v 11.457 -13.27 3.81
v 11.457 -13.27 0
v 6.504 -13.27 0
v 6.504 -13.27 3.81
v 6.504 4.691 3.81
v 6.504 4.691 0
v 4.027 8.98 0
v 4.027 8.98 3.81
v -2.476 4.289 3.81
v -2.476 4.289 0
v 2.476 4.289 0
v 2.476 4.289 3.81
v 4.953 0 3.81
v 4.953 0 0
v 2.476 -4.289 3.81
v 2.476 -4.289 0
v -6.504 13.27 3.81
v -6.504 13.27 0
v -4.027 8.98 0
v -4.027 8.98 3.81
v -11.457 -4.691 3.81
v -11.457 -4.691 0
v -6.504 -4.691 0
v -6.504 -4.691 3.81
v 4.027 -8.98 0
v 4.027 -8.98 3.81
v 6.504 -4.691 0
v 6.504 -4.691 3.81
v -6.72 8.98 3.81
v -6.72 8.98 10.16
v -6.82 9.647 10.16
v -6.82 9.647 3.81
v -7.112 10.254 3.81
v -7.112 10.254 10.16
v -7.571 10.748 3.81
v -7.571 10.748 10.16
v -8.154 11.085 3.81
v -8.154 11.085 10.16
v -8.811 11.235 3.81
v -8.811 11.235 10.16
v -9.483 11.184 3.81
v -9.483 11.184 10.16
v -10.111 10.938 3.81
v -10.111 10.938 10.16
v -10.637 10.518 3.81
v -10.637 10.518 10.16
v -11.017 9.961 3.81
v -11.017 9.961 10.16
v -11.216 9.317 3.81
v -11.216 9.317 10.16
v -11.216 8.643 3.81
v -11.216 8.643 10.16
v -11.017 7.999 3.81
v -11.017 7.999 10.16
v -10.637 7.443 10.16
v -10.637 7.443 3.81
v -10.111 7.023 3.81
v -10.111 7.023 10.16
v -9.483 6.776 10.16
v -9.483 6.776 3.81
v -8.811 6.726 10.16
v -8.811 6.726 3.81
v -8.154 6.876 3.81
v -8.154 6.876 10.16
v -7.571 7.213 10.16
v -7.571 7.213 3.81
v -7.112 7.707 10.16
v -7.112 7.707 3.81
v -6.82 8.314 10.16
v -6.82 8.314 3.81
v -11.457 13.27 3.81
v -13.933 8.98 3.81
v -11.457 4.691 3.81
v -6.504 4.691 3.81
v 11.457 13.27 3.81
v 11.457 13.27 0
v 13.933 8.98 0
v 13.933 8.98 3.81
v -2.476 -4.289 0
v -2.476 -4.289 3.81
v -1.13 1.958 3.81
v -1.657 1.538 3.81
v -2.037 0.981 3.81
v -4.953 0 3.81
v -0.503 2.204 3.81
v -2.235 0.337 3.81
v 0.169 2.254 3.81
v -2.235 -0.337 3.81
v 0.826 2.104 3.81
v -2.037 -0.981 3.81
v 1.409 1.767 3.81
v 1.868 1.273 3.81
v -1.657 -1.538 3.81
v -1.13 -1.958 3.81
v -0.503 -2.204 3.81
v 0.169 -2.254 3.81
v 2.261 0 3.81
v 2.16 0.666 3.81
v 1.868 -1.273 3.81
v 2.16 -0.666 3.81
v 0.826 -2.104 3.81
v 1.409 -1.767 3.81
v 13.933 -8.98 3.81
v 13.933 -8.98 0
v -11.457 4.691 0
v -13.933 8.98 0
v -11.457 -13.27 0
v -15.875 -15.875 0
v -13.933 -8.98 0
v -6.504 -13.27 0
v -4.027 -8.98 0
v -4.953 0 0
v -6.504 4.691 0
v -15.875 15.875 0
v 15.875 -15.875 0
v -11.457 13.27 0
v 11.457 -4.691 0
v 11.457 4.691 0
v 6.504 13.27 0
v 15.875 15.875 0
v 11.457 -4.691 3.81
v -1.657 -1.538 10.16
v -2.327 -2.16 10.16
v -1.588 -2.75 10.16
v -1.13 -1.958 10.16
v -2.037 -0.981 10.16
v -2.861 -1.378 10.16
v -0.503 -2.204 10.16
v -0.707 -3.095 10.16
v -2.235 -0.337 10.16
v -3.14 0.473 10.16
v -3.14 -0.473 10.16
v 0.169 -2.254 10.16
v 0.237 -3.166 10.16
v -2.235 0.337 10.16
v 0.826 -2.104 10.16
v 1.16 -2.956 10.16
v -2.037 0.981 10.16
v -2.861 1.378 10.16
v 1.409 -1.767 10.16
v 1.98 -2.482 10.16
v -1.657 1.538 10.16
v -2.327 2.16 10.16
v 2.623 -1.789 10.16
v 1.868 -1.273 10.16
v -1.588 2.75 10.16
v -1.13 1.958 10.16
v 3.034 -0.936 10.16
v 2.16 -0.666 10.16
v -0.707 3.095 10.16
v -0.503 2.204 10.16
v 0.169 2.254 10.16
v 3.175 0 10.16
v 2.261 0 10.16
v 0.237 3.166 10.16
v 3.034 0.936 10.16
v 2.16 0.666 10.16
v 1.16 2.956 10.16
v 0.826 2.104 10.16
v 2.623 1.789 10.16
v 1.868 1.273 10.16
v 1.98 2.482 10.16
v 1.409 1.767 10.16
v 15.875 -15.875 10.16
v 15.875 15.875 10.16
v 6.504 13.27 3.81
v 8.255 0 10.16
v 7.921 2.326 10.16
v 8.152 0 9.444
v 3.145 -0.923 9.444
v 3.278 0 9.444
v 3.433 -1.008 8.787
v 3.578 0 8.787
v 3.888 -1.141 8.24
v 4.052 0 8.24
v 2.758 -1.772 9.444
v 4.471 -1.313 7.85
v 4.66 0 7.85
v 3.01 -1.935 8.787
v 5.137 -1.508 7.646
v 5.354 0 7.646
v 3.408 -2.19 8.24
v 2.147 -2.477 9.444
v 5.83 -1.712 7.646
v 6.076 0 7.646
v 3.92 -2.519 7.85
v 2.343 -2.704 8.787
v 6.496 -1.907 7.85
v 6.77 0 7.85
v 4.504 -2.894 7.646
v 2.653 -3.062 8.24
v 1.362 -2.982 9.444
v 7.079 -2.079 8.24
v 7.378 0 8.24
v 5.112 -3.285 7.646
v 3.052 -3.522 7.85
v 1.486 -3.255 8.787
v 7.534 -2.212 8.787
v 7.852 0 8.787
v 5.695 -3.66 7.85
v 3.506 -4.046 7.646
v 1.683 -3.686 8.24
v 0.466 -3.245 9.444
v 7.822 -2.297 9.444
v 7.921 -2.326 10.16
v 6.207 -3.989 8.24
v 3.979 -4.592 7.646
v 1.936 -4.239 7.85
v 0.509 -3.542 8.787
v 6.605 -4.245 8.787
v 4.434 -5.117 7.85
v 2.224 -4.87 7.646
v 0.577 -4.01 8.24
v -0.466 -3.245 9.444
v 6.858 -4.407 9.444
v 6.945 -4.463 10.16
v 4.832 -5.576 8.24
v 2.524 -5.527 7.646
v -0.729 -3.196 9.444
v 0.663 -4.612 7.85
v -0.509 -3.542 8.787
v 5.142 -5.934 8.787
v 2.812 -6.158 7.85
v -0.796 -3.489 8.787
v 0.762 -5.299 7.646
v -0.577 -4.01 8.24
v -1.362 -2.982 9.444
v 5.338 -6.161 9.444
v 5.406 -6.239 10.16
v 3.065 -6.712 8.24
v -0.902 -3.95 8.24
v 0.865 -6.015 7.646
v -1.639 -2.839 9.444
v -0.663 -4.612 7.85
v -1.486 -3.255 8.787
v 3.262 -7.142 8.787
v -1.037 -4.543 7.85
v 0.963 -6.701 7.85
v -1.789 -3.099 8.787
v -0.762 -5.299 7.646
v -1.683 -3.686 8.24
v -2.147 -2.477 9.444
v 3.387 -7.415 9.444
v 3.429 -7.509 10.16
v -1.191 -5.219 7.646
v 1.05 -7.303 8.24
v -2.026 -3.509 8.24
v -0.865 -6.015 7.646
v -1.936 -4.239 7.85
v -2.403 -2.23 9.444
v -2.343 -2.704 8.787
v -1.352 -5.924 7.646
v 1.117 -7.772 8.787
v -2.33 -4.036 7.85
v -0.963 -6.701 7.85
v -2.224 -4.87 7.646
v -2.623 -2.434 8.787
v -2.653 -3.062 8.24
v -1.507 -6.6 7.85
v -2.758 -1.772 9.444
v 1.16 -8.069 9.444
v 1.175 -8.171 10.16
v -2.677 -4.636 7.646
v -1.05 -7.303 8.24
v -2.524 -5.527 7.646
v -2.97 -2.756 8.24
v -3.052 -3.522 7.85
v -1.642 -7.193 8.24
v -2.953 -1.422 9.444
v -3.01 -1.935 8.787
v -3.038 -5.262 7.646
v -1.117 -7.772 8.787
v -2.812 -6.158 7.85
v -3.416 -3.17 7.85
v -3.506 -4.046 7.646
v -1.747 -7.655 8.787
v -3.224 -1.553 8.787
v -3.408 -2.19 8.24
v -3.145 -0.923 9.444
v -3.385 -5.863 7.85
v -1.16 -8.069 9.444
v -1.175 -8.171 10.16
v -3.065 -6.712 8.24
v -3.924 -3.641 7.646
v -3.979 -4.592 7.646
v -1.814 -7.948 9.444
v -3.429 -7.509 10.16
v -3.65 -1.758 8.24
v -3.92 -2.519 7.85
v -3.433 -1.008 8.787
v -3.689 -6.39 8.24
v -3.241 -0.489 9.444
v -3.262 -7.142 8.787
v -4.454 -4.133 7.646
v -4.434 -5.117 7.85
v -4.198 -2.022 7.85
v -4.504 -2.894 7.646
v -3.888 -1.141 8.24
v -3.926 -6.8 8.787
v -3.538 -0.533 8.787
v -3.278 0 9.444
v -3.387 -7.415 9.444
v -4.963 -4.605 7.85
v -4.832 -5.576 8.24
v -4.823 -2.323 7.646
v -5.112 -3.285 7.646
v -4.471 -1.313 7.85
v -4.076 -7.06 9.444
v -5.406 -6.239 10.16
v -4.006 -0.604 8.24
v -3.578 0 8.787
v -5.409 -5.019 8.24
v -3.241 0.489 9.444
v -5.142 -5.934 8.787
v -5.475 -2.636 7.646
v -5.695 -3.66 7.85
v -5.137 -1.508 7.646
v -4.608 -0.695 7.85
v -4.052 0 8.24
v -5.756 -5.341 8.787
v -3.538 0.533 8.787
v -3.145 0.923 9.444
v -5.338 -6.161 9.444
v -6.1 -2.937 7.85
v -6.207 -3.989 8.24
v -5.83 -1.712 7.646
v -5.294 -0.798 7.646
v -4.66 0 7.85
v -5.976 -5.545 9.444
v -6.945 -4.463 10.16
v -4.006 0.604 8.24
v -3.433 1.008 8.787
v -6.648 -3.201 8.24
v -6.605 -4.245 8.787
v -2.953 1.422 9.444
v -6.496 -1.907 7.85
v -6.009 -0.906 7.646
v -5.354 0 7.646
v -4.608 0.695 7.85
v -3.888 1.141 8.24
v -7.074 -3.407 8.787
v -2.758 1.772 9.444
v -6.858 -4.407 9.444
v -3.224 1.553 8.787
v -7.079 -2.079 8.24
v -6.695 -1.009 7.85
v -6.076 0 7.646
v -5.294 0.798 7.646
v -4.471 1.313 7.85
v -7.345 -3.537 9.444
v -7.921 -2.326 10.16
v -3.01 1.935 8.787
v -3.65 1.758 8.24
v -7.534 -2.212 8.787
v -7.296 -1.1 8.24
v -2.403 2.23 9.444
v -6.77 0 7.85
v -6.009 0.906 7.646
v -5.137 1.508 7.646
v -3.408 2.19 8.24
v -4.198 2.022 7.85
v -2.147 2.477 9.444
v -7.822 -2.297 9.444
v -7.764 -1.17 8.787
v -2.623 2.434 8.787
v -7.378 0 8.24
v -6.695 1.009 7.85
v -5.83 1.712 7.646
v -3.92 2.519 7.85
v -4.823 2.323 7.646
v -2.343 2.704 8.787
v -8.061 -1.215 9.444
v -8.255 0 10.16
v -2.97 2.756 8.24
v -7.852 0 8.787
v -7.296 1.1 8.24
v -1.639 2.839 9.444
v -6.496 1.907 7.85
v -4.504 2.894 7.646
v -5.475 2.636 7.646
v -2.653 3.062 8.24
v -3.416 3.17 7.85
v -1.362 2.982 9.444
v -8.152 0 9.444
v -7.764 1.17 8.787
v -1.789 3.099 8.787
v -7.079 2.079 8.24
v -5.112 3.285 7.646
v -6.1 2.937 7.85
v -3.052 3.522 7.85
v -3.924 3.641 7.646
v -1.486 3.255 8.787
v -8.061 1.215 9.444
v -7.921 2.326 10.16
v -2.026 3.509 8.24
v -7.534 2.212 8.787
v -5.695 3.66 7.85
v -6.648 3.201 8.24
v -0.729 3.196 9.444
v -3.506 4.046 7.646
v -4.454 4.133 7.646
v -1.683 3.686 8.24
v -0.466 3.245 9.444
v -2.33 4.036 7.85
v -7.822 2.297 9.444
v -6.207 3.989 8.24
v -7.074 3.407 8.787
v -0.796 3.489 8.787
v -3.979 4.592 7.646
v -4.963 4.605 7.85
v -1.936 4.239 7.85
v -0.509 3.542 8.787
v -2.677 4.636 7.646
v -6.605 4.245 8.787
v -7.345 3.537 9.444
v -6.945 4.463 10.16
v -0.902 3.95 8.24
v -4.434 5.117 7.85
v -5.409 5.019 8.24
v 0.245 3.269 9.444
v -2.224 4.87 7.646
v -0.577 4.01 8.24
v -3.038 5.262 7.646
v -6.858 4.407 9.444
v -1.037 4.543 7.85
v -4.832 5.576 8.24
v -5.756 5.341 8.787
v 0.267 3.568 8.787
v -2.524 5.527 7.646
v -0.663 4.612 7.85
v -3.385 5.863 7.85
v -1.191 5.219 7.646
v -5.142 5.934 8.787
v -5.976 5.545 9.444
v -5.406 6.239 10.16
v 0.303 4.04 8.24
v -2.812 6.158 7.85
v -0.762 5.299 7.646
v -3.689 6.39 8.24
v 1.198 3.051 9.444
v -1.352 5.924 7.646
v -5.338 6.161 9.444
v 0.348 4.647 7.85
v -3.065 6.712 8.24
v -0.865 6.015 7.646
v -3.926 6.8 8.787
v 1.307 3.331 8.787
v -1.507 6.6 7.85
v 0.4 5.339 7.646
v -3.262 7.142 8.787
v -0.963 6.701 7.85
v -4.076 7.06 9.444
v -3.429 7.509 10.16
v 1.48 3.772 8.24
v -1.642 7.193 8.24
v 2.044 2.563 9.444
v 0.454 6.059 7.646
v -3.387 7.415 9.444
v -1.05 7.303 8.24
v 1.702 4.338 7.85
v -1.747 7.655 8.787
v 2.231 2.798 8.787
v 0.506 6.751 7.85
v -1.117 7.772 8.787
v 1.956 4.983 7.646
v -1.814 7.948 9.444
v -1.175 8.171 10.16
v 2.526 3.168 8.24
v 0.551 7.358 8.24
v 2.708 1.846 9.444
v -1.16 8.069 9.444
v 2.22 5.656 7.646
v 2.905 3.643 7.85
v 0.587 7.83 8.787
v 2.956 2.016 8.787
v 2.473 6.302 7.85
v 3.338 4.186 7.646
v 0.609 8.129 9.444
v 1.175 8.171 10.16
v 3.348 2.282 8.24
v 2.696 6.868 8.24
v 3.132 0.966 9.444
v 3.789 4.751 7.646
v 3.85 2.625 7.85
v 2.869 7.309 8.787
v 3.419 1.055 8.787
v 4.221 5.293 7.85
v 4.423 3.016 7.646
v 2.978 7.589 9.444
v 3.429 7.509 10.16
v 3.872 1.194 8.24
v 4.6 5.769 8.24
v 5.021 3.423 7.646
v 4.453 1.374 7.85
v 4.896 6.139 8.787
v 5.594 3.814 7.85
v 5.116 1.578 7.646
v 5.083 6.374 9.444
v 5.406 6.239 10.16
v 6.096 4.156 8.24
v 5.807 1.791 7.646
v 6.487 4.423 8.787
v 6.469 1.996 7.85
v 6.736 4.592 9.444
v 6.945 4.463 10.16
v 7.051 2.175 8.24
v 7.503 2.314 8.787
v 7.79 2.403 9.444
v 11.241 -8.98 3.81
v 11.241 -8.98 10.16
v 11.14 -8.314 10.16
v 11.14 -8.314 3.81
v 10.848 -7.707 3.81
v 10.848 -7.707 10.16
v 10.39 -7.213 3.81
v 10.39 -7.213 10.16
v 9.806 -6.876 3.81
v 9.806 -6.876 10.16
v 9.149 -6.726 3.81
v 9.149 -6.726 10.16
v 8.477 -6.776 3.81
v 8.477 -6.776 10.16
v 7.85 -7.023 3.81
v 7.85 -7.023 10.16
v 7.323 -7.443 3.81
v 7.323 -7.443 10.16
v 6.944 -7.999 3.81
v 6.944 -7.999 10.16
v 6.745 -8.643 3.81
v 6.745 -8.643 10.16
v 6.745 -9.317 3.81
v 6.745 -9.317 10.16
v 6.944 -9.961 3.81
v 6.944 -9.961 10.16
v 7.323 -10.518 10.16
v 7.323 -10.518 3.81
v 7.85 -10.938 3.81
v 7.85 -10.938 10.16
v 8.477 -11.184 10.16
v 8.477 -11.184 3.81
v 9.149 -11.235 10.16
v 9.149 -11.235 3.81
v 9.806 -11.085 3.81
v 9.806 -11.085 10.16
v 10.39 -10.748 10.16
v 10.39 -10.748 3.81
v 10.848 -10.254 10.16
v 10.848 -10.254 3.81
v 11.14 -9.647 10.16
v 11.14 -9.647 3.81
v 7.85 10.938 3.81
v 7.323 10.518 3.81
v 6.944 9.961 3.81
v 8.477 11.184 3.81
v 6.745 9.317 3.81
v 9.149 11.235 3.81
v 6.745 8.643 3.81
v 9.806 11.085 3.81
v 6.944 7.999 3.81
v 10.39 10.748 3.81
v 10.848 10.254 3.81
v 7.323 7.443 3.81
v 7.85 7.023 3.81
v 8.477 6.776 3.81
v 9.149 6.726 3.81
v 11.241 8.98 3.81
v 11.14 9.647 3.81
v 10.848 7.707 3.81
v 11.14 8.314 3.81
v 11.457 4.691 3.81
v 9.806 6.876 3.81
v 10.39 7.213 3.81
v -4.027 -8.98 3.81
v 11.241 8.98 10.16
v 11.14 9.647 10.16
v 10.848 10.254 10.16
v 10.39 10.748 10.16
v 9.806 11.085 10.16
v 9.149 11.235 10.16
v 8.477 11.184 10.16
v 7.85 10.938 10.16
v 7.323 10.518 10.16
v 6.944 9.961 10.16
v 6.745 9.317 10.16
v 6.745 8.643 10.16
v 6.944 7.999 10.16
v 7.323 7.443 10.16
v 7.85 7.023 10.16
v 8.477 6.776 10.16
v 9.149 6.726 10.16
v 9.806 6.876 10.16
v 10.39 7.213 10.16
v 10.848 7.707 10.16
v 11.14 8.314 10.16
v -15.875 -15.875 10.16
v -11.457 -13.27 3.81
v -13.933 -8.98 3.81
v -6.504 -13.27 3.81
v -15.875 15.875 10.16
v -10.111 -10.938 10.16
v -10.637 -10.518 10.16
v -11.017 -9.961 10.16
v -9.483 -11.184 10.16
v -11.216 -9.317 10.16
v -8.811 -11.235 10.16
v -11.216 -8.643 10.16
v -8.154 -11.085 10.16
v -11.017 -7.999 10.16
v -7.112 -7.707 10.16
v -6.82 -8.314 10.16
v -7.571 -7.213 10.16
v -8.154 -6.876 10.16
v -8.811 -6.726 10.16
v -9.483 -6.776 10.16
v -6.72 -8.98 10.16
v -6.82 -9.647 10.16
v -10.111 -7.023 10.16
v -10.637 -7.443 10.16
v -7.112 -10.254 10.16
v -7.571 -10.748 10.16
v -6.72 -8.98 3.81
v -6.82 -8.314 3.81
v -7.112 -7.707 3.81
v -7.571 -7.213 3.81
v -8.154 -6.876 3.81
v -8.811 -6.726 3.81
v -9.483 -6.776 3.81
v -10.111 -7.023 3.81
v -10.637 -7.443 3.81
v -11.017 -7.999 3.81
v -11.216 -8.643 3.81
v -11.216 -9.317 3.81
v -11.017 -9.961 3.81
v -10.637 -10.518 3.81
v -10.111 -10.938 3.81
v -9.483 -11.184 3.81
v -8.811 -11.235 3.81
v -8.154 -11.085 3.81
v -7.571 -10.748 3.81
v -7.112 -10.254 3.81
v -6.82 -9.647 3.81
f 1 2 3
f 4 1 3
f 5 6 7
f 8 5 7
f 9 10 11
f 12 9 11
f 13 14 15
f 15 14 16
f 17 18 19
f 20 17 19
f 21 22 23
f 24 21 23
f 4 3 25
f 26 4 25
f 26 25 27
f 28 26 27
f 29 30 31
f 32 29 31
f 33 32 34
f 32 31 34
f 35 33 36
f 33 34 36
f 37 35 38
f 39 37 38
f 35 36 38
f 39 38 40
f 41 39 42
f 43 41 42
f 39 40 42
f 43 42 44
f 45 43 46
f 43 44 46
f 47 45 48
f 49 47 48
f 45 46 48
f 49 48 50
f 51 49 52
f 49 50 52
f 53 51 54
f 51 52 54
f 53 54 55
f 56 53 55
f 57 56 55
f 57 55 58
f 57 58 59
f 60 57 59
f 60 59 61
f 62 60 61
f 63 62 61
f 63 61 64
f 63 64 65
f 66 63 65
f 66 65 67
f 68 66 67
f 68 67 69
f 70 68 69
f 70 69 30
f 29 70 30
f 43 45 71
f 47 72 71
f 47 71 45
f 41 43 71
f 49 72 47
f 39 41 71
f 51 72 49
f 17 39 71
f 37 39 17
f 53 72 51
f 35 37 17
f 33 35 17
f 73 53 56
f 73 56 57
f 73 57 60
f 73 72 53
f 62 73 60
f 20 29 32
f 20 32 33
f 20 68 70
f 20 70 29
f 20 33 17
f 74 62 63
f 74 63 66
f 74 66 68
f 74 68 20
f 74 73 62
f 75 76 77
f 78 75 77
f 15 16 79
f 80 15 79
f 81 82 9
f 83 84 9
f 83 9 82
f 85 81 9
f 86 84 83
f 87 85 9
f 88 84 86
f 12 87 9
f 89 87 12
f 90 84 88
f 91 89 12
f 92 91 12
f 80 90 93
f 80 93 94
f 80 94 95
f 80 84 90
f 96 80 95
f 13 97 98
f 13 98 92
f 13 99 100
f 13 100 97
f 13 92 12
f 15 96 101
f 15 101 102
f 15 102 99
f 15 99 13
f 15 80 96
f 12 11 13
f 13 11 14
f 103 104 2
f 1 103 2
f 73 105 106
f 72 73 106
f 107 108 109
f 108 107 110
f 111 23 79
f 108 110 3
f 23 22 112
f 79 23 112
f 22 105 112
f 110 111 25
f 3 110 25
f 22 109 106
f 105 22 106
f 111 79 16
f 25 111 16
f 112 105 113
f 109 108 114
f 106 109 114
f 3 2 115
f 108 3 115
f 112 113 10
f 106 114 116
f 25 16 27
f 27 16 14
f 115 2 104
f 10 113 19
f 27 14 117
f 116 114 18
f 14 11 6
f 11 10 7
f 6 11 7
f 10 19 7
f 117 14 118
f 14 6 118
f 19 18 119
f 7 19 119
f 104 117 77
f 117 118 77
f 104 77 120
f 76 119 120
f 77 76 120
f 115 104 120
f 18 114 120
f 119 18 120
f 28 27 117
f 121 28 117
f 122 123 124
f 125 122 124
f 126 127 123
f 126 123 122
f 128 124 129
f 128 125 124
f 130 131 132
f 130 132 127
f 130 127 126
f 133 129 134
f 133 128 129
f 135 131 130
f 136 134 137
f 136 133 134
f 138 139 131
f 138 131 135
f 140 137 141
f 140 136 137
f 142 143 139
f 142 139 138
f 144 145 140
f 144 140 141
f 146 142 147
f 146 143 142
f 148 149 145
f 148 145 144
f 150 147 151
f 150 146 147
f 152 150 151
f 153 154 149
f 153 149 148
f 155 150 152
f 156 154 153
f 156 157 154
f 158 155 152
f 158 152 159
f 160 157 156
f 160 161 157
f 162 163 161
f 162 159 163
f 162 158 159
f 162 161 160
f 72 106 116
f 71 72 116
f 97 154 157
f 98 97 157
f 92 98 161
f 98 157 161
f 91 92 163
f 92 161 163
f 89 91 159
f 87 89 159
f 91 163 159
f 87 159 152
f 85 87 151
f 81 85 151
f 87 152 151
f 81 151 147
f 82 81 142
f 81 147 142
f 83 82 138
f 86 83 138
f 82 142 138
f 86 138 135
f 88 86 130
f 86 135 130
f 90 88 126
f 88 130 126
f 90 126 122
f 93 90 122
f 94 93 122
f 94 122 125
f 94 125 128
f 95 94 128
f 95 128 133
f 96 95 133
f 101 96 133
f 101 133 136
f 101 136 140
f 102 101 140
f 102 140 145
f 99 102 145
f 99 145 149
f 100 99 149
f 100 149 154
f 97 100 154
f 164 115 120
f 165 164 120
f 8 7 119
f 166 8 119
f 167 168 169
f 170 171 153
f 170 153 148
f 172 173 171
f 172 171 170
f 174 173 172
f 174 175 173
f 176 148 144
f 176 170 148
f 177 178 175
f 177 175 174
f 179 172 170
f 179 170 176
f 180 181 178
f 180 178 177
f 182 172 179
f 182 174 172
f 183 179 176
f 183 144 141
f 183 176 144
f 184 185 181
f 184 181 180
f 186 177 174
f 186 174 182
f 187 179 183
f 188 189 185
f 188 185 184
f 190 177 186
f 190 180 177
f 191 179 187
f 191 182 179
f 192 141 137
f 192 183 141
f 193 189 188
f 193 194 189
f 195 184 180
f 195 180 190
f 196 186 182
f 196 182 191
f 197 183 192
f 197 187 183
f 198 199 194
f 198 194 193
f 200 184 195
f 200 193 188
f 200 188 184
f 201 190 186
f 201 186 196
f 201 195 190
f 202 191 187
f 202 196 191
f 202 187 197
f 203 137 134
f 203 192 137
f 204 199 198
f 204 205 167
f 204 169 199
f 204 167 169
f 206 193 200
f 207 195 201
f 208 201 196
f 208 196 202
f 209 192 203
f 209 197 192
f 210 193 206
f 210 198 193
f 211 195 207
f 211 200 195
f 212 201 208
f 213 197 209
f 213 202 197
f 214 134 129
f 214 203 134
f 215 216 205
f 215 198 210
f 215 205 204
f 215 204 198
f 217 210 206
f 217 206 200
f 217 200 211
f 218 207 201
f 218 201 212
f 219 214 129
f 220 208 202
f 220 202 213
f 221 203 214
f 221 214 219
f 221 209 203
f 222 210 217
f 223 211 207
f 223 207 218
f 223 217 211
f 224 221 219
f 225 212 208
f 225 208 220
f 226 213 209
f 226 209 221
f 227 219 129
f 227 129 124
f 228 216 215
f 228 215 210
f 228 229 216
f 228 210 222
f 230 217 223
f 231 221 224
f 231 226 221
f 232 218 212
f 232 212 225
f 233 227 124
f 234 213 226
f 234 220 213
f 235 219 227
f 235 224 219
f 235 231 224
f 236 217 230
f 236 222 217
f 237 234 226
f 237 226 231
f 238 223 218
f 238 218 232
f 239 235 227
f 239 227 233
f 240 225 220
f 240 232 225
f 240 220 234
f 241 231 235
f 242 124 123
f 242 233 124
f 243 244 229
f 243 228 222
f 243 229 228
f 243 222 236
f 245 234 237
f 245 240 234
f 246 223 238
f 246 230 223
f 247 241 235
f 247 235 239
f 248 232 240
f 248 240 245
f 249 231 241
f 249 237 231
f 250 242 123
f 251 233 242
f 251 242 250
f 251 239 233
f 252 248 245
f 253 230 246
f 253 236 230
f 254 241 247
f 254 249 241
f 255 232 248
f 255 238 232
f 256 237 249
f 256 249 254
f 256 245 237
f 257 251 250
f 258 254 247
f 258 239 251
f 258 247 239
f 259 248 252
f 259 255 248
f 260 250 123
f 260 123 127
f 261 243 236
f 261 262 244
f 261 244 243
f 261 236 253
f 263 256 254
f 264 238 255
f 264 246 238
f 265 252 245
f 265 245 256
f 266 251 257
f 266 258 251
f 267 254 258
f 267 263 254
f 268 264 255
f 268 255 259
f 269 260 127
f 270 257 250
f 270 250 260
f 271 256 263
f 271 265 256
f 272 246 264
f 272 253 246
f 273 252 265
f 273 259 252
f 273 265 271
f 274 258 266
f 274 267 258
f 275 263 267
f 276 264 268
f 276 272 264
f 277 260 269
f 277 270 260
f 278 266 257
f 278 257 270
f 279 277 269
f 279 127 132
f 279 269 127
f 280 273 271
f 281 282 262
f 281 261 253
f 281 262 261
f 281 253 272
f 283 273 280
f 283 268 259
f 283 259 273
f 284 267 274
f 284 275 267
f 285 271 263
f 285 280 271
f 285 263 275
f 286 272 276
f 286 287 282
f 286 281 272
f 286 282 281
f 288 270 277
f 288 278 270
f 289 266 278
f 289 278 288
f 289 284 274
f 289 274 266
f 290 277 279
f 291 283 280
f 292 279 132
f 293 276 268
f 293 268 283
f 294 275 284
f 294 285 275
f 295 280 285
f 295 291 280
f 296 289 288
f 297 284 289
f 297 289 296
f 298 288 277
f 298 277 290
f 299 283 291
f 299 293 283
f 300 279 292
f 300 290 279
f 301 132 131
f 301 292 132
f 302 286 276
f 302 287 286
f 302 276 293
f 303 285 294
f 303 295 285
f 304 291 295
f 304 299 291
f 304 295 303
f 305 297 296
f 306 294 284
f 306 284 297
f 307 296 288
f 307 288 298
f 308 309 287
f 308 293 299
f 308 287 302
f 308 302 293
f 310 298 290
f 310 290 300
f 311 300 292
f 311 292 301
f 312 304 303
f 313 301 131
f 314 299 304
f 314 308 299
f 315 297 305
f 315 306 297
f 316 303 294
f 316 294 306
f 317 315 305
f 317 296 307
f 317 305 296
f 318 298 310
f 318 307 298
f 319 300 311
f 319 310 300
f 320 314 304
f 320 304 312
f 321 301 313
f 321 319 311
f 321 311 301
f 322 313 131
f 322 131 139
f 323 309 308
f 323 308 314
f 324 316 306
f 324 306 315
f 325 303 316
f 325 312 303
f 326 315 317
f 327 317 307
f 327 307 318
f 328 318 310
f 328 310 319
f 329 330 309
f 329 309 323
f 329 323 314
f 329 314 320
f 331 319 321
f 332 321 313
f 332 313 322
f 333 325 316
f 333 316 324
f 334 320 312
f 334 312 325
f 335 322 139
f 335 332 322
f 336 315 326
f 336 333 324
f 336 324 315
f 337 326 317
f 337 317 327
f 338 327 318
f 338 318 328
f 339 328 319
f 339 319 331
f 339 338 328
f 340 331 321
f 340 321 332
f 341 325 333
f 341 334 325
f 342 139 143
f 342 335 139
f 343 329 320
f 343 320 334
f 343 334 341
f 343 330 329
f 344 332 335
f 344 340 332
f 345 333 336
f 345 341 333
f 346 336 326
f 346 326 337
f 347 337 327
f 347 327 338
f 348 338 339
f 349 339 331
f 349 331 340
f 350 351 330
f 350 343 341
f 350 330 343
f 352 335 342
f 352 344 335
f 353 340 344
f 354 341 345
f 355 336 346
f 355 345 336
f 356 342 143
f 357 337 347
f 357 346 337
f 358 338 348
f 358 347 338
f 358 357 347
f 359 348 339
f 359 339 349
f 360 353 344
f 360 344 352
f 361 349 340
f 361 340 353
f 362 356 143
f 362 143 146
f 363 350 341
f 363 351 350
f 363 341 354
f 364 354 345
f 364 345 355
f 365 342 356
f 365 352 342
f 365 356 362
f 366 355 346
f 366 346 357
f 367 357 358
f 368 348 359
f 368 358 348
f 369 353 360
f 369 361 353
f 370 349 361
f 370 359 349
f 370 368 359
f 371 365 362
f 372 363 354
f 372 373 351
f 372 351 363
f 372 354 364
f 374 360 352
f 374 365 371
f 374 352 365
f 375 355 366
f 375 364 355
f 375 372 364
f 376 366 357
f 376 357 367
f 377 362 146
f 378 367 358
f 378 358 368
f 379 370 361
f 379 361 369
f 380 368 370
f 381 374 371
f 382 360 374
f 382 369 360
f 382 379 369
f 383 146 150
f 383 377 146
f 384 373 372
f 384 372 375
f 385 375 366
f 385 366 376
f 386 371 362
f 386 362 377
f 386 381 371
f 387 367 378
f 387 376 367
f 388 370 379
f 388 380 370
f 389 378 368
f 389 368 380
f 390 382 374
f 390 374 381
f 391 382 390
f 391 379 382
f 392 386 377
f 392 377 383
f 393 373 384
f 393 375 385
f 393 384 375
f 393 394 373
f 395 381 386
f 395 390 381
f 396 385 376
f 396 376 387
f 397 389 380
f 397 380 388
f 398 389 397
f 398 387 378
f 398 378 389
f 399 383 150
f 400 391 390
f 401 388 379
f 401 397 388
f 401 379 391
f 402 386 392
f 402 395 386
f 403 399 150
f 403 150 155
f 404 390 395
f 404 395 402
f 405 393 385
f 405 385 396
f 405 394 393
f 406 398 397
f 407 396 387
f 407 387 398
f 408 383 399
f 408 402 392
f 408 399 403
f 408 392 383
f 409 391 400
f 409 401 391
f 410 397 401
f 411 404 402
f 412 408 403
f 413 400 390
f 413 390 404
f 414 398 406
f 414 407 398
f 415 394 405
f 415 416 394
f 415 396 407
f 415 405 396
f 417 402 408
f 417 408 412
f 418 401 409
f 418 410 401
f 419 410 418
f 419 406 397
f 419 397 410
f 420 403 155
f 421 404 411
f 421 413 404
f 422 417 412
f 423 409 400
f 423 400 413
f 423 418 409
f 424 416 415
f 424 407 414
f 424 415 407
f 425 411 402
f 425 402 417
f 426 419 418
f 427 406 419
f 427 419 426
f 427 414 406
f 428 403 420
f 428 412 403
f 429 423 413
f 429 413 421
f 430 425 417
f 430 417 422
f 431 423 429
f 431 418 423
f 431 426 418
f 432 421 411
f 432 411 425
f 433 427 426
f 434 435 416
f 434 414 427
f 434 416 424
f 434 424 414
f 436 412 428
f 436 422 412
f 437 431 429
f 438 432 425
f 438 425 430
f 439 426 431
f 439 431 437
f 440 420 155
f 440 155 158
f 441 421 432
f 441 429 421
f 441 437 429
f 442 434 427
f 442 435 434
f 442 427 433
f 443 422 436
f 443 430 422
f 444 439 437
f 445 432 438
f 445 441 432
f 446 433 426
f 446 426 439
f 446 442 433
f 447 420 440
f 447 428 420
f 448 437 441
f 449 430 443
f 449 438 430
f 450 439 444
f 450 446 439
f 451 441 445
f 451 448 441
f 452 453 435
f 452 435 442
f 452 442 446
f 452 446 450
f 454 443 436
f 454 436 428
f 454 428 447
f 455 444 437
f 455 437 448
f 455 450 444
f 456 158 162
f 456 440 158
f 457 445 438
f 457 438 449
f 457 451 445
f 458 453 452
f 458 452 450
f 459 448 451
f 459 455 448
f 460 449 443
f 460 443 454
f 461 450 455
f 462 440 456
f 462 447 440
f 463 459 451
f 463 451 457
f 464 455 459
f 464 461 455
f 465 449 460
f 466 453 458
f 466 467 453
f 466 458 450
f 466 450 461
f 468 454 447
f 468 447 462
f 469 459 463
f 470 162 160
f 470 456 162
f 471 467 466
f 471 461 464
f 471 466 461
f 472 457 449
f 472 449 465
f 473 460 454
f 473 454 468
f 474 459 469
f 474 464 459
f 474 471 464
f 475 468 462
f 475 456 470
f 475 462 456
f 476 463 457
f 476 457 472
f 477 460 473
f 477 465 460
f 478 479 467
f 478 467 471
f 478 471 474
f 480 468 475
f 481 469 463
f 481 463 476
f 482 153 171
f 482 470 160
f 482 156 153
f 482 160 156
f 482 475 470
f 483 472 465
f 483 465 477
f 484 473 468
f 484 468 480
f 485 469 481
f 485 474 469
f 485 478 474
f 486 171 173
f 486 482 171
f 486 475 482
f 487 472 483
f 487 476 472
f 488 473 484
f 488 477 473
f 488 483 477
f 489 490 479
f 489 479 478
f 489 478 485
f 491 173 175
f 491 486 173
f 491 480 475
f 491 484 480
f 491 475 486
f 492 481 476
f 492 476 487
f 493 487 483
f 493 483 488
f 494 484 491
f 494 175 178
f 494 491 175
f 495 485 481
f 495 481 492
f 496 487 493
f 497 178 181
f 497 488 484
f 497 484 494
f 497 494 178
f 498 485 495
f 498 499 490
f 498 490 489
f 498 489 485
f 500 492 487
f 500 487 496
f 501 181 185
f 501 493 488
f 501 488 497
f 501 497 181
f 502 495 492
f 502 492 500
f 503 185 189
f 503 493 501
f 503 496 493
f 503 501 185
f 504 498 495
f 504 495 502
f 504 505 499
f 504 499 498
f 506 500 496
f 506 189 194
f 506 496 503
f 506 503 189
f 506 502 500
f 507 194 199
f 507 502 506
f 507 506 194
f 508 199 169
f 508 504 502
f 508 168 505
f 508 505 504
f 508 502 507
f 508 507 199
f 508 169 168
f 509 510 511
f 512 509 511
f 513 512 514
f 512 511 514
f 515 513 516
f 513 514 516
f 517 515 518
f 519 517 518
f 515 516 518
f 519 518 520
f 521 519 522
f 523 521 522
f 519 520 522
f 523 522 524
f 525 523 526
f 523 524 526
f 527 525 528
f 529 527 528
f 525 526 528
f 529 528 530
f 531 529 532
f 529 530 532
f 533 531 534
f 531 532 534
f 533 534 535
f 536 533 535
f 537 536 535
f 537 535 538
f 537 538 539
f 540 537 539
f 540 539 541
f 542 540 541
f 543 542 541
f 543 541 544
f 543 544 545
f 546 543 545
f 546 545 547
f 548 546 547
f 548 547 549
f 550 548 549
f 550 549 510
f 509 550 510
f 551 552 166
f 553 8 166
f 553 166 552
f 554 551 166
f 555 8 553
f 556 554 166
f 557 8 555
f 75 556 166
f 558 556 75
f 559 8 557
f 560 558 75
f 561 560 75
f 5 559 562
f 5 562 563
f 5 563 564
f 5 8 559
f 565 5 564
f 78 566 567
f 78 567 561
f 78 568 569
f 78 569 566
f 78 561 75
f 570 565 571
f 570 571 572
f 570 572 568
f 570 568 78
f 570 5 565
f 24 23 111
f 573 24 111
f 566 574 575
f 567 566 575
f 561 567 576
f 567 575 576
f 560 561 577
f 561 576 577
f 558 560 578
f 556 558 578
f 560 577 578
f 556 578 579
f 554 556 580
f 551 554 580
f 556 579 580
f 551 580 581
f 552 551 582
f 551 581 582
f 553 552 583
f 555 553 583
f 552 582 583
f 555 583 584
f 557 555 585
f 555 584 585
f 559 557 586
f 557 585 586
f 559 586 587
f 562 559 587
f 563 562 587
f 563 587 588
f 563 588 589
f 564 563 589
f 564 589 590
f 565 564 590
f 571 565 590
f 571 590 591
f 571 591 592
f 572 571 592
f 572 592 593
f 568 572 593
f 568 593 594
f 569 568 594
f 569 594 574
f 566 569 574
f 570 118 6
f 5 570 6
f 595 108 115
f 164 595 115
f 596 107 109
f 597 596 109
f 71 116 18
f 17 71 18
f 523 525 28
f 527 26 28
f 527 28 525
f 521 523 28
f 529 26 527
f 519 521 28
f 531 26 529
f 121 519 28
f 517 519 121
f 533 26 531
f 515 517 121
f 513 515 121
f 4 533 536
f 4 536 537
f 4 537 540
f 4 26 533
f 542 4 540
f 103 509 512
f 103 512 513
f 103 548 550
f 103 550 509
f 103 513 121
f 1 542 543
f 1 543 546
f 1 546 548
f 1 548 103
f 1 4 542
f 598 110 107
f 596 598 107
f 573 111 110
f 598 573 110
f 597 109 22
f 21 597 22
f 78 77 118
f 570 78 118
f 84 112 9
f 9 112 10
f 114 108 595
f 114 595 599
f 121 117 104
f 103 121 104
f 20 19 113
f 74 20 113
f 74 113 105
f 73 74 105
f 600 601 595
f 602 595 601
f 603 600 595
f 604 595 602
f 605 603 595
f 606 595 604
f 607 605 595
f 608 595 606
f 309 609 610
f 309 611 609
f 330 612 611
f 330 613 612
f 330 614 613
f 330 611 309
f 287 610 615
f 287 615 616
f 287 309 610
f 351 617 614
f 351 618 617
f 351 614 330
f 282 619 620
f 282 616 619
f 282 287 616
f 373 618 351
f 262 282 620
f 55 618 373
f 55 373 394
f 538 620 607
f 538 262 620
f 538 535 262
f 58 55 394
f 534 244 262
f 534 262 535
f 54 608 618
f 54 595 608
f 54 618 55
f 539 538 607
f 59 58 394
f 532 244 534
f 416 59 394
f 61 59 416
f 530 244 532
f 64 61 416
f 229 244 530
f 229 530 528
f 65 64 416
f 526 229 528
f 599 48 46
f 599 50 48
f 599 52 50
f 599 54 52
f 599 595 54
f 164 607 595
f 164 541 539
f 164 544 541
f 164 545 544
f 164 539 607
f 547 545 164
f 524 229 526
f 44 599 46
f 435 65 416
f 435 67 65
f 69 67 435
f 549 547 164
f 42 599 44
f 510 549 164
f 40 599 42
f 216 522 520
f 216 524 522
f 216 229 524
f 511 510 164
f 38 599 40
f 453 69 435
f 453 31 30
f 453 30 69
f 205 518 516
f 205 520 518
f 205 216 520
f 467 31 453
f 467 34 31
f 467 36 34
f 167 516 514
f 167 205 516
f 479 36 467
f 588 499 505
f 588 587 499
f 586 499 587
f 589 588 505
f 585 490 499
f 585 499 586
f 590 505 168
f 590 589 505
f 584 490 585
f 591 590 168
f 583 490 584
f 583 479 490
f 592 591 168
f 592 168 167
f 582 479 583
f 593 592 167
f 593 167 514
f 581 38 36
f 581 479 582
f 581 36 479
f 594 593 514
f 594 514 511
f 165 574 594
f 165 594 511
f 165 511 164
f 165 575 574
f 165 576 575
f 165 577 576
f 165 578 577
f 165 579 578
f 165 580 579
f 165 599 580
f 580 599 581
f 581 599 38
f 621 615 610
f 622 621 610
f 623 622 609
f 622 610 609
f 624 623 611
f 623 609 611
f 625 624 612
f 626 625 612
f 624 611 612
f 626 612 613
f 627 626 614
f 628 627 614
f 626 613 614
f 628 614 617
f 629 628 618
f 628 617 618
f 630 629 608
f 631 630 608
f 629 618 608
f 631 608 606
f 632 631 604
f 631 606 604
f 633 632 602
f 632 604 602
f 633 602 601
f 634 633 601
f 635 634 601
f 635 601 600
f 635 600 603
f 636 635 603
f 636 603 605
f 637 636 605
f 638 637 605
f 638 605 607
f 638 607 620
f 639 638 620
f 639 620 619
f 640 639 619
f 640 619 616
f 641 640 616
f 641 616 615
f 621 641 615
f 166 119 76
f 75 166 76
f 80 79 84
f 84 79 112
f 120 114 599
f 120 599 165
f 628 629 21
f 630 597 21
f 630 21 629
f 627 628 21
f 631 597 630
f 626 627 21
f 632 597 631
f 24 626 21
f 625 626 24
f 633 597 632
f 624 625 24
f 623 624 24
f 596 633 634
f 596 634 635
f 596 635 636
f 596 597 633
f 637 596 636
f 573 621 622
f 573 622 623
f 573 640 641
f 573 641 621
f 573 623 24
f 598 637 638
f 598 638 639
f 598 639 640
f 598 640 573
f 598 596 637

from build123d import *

# Parameters (mm, degrees)
F0_W     = 31.75
F0_H     = 31.75
F1_DEPTH = 10.16
F2_R     = 2.54
F4_R     = 2.2606
F5_DEPTH = 25.4
F7_DEPTH = 3.81


with BuildPart() as f1:
    # F0 (on Top) → F1 (new body)
    with BuildSketch(Plane.XY):
        Rectangle(F0_W, F0_H)
    extrude(amount=F1_DEPTH)

    # F2 (on Front) → F3 (revolve, cut)
    with BuildSketch(Plane.XZ):
        with Locations((5.715, 10.16)):
            Circle(F2_R)
    revolve(axis=Axis((0, 0, 8.061379), (0, 0, -1)), mode=Mode.SUBTRACT)

    # F4 (on face) → F5 (cut)
    with BuildSketch(Plane.XY.offset(10.16)):
        Circle(F4_R)
        with Locations((-8.980256, 8.980256)):
            Circle(F4_R)
        with Locations((8.980256, 8.980256)):
            Circle(F4_R)
        with Locations((-8.980256, -8.980256)):
            Circle(F4_R)
        with Locations((8.980256, -8.980256)):
            Circle(F4_R)
    extrude(amount=-F5_DEPTH, mode=Mode.SUBTRACT)

    # F6 (on face) → F7 (cut)
    with BuildSketch(Plane(origin=(0, 0, 0), x_dir=(1, 0, 0), z_dir=(0, 0, -1))):
        Polygon((-2.4765, -4.289424), (2.4765, -4.289424), (4.953, 0), (2.4765, 4.289424), (-2.4765, 4.289424), (-4.953, 0), align=None)
        Polygon((-11.456756, 4.690832), (-6.503756, 4.690832), (-4.027256, 8.980256), (-6.503756, 13.26968), (-11.456756, 13.26968), (-13.933256, 8.980256), align=None)
        Polygon((11.456756, 13.26968), (6.503756, 13.26968), (4.027256, 8.980256), (6.503756, 4.690832), (11.456756, 4.690832), (13.933256, 8.980256), align=None)
        Polygon((4.027256, -8.980256), (6.503756, -13.26968), (11.456756, -13.26968), (13.933256, -8.980256), (11.456756, -4.690832), (6.503756, -4.690832), align=None)
        Polygon((-4.027256, -8.980256), (-6.503756, -4.690832), (-11.456756, -4.690832), (-13.933256, -8.980256), (-11.456756, -13.26968), (-6.503756, -13.26968), align=None)
    extrude(amount=-F7_DEPTH, mode=Mode.SUBTRACT)


solid = f1.part
